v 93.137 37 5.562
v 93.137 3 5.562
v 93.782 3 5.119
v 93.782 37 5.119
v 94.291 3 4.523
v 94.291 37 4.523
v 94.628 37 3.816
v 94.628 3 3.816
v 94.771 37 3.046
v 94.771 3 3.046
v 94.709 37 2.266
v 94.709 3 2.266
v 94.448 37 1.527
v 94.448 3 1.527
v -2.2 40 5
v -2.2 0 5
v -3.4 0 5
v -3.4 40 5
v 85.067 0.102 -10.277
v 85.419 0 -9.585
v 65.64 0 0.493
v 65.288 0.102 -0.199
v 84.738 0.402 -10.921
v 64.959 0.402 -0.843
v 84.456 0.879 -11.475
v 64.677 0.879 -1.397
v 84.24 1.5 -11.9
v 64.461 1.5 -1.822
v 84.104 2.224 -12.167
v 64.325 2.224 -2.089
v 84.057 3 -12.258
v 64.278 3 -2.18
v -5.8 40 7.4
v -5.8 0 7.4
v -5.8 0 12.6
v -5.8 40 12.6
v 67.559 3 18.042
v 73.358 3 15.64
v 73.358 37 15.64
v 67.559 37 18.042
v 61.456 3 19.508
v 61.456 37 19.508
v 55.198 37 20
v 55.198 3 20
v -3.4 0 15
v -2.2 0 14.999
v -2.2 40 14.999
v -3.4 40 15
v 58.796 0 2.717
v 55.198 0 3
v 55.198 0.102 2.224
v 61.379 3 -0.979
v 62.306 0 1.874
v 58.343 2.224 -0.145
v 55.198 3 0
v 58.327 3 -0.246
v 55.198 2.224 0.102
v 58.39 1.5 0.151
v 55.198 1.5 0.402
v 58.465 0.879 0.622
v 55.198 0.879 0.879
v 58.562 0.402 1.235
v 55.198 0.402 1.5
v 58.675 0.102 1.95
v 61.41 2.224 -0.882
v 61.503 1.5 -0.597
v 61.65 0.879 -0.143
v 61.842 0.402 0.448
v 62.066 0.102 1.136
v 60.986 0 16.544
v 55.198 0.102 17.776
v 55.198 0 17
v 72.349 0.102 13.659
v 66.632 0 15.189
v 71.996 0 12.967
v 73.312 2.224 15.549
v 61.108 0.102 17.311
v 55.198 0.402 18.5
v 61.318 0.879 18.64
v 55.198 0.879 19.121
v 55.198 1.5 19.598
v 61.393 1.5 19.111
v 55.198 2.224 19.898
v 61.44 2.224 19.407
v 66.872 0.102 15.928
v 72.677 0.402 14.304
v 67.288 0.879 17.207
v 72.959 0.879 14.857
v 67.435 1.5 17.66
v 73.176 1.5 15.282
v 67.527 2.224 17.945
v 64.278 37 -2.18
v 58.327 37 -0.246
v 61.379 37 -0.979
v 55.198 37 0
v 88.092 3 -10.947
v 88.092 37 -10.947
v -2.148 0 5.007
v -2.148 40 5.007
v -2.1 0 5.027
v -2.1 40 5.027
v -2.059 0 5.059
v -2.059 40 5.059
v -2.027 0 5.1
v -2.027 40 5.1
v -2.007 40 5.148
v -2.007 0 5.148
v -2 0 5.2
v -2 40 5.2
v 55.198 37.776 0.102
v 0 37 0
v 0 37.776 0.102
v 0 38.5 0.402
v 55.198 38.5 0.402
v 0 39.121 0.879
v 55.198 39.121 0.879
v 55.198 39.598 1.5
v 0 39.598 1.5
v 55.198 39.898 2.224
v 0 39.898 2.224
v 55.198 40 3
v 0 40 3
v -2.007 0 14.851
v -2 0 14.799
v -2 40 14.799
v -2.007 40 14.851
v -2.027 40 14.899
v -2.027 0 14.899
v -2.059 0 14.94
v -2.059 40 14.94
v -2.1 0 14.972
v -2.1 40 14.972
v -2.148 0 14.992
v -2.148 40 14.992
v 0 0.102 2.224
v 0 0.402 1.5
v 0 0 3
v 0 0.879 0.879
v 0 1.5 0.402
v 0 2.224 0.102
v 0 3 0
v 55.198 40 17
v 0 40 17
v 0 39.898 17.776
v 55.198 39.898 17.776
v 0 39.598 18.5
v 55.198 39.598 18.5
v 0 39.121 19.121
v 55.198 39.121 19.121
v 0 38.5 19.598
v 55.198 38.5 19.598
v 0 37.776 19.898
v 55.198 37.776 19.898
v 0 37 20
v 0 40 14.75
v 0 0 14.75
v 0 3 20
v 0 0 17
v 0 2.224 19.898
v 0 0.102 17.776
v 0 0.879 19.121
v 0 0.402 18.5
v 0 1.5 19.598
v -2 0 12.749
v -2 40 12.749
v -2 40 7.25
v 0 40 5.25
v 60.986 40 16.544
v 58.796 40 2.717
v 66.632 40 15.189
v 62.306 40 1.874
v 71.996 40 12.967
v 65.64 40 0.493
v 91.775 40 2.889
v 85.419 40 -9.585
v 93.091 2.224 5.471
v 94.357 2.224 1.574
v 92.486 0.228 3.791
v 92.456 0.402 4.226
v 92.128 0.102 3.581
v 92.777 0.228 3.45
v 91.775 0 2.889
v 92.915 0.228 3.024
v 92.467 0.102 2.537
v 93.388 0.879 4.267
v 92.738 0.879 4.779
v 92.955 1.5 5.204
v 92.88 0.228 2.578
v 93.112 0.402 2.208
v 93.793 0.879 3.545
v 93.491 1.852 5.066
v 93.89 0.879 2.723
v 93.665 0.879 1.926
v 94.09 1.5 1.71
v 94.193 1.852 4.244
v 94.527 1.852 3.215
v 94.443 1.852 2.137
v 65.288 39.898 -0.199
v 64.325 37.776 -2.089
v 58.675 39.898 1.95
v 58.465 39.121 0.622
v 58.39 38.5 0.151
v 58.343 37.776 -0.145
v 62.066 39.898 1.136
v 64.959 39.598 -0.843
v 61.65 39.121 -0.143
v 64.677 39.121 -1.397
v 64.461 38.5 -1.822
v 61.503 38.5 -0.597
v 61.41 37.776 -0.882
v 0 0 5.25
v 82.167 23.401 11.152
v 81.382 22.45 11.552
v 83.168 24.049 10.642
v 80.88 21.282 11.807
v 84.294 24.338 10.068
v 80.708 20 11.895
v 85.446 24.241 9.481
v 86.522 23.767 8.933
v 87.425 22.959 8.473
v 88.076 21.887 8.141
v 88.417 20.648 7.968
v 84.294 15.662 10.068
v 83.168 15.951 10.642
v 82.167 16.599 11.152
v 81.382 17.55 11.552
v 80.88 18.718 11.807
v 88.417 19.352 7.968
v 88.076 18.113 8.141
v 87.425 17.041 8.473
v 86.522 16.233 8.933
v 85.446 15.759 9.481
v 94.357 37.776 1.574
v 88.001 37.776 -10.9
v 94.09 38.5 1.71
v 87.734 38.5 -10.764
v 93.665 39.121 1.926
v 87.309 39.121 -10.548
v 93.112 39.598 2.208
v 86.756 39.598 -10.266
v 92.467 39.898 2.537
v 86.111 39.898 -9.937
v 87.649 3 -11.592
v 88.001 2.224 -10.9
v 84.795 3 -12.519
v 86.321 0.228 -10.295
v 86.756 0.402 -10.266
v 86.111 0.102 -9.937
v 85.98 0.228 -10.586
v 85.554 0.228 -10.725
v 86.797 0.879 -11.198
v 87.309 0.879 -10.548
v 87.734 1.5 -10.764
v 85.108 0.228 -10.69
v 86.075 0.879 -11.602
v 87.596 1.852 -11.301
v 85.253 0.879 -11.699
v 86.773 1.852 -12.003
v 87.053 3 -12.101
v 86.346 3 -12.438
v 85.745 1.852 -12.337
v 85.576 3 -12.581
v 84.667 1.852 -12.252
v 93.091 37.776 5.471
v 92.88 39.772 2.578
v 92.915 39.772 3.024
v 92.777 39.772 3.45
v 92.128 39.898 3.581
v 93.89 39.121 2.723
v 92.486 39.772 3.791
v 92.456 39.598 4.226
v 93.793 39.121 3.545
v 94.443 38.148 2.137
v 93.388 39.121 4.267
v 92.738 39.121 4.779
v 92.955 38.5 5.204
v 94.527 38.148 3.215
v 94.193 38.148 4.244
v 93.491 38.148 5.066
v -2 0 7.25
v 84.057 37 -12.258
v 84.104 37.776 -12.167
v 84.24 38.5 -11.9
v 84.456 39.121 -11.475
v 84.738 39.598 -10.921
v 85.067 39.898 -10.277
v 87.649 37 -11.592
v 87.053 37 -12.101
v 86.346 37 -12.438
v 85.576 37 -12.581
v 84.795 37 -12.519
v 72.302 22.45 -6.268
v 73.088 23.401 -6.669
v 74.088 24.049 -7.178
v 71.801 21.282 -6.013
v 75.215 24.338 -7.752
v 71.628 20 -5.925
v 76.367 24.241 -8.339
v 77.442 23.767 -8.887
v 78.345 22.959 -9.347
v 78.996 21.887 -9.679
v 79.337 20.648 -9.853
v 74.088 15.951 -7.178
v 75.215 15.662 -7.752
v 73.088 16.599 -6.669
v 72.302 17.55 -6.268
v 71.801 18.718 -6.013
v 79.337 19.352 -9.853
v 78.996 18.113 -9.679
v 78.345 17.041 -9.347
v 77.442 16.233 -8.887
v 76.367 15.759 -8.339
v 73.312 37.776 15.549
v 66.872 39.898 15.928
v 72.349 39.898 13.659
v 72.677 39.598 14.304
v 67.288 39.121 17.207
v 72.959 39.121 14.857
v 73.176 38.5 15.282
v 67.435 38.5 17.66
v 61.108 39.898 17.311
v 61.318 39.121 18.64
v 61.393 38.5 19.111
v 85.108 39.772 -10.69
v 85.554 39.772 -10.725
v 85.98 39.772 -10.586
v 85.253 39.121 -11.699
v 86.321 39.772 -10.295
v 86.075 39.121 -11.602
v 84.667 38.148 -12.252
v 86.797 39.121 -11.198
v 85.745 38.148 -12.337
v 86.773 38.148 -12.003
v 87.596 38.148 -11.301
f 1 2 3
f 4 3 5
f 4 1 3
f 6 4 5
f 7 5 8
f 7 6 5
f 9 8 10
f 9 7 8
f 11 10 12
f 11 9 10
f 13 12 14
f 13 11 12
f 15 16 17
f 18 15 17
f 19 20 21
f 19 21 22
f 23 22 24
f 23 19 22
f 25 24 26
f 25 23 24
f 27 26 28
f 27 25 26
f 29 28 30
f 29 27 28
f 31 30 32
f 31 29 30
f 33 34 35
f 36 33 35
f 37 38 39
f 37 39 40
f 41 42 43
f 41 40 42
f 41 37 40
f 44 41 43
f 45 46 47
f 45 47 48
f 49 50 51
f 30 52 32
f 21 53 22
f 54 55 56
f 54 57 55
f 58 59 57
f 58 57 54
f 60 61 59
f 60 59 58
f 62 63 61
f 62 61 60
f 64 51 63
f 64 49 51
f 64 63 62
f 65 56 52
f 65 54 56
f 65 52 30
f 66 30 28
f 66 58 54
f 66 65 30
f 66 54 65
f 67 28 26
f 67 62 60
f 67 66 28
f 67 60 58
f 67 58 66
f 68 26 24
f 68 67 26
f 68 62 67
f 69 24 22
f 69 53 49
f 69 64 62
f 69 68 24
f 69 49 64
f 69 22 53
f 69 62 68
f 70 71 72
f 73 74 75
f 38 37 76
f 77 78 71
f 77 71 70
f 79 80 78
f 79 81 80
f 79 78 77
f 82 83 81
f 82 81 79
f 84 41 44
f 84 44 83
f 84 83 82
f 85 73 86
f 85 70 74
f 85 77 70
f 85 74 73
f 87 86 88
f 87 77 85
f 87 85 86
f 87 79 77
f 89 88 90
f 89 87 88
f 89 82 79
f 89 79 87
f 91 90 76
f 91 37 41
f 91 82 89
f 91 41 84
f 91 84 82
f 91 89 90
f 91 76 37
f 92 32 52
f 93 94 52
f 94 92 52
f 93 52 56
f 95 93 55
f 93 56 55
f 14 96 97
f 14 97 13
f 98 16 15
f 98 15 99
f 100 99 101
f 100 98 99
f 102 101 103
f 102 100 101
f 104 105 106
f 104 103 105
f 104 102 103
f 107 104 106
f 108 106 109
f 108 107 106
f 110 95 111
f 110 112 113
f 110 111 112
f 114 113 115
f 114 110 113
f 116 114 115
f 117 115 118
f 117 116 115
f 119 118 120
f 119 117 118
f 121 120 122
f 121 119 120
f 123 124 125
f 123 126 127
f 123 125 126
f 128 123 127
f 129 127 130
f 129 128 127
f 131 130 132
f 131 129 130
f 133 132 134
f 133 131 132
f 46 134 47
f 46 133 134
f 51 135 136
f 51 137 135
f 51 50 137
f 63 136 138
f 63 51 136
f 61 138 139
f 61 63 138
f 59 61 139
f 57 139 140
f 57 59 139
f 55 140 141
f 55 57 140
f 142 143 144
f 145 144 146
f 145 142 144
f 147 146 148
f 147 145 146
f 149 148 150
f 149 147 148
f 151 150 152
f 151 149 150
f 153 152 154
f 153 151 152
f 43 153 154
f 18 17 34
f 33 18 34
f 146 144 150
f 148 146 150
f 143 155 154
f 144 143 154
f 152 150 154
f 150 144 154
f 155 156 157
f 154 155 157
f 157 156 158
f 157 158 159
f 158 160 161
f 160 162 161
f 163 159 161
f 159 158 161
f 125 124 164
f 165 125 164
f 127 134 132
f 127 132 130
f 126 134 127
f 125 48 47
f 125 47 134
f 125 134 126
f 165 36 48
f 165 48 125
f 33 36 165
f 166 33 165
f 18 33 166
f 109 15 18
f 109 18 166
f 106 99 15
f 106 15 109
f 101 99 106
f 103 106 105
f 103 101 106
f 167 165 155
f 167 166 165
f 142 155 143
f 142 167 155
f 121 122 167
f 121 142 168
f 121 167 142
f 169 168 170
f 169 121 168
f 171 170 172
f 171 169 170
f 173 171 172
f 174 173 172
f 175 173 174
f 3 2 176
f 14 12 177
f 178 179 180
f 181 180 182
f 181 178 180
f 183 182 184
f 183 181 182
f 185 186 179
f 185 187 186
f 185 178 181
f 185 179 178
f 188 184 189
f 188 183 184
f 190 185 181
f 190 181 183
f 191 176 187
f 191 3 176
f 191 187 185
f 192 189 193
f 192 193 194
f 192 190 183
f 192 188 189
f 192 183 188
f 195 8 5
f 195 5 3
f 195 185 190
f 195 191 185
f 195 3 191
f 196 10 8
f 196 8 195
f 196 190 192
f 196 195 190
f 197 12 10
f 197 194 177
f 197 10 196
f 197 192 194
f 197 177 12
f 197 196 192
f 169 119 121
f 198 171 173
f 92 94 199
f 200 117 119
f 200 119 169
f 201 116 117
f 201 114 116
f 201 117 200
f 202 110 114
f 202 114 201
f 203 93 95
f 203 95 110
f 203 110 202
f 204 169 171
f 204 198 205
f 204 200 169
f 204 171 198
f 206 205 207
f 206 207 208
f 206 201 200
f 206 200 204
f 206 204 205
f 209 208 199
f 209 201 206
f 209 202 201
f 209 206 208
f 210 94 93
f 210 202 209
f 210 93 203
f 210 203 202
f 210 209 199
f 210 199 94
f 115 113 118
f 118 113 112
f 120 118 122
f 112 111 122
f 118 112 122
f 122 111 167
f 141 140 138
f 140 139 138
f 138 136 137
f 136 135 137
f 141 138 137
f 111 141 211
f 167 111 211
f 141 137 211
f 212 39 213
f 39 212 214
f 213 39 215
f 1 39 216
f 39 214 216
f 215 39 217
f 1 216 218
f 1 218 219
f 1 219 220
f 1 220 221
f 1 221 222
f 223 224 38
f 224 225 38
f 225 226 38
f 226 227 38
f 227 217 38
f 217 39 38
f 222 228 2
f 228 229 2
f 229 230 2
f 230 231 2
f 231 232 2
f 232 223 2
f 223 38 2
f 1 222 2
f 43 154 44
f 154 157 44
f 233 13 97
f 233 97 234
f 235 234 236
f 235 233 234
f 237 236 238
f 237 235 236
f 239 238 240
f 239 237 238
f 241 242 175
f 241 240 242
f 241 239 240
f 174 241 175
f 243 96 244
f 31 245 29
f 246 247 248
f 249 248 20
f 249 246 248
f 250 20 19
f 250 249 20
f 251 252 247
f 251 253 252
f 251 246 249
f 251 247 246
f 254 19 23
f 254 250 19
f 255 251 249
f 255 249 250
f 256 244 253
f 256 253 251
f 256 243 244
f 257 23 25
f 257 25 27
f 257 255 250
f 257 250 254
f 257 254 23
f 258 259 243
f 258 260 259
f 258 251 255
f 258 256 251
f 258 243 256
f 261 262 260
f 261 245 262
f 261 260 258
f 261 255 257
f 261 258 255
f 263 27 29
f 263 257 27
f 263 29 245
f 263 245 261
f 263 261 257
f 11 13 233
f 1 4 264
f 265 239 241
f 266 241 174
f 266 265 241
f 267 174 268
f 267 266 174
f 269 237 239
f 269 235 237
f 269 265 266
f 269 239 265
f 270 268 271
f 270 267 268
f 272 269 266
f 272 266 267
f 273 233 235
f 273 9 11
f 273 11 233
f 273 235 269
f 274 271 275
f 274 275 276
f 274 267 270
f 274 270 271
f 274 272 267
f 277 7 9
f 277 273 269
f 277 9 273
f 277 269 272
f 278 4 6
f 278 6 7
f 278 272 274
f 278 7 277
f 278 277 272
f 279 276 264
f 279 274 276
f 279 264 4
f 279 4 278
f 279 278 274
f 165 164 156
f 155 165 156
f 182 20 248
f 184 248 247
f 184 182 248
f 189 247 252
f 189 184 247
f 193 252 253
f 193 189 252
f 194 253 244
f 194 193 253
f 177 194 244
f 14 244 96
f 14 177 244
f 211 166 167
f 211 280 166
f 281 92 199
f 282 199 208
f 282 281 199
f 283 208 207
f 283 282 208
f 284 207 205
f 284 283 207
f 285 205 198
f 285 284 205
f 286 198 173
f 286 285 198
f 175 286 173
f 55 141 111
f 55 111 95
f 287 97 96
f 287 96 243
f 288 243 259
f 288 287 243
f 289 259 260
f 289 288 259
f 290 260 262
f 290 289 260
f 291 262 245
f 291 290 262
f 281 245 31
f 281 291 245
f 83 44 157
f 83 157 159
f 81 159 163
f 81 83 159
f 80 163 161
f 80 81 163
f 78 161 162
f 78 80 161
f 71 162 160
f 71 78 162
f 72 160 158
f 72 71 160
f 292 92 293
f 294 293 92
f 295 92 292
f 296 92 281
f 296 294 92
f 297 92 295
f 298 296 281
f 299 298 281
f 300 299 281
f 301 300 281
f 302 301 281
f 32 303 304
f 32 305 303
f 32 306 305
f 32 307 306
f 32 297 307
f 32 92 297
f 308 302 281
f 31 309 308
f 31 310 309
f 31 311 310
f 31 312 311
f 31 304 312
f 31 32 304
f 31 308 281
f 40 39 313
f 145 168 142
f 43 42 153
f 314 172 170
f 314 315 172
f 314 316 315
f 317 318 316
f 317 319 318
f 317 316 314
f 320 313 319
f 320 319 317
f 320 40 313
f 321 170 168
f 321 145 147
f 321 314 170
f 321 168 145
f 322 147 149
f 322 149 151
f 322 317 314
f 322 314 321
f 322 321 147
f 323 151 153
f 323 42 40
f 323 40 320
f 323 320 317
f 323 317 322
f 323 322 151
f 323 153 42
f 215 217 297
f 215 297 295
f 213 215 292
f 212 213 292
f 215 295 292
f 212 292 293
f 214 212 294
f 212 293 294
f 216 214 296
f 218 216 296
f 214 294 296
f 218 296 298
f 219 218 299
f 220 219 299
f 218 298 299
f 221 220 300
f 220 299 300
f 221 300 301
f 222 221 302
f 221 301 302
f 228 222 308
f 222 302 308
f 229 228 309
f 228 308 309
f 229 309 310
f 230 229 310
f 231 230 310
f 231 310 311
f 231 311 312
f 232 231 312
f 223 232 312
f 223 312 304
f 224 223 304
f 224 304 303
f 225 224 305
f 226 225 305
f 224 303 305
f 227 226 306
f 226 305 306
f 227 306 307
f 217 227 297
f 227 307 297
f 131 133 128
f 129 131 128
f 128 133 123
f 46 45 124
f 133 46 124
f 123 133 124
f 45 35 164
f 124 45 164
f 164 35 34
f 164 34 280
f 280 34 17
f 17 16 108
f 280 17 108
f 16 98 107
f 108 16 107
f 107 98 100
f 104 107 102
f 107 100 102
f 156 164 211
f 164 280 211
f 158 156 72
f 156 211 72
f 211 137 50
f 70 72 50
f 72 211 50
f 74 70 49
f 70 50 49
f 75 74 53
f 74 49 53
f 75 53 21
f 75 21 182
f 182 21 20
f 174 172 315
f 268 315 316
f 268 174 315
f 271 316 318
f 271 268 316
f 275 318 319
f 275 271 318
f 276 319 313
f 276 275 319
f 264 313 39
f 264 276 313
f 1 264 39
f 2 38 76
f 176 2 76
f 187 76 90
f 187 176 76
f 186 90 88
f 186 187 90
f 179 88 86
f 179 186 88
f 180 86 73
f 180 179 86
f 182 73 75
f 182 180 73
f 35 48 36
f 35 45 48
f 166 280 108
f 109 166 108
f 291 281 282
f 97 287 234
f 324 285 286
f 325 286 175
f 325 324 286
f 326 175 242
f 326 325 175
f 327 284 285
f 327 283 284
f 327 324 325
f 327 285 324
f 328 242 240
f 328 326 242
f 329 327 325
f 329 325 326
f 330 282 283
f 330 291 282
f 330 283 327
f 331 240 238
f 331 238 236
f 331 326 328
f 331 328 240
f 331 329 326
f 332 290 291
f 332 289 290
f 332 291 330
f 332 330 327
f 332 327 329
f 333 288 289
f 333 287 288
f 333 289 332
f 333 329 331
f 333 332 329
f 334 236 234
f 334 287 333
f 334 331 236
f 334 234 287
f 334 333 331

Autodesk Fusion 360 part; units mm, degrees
sketch "Sketch1" plane through (0, 0, 0) normal (0, 1, 0) x (1, 0, 0)
  line L0 (0, 0) -> (55.1984, 0)
  line L1 (64.2782, 2.1799) -> (86.7302, 13.6197)
  line L2 (0, -20) -> (55.1984, -20)
  line L3 (73.358, -15.6403) -> (95.81, -4.2004)
  line L4 (86.7302, 13.6197) -> (95.81, -4.2004)
  line L5 (-2, -12.9989) -> (-2, -14.799)
  line L6 (-2.1998, -14.999) -> (-3.4, -15)
  line L7 (-2, -7) -> (-2, -5.2)
  line L8 (-2.2, -5) -> (-3.4, -5)
  line L9 (-3.4, -5) -> (7.0965, -5) construction
  line L10 (-3.4, -15) -> (7.6345, -15) construction
  line L11 (-5.8, -10) -> (-5.8, -7.4)
  line L12 (-5.8, -10) -> (-5.8, -12.6)
  line L13 (-3.4, -5) -> (-5.8, -7.4)
  line L14 (-3.4, -15) -> (-5.8, -12.6)
  line L15 (0, 0) -> (0, -5)
  line L16 (0, -15) -> (0, -20)
  arc A0 (55.1984, -20) -> (73.358, -15.6403) centre (55.1984, 20) ccw
  arc A1 (55.1984, 0) -> (64.2782, 2.1799) centre (55.1984, 20) ccw
  line L17 (-2, -12.9989) -> (-2, -12.7489)
  line L18 (0, -15) -> (0, -14.75)
  line L19 (-2, -12.7489) -> (0, -14.75)
  line L20 (0, -5) -> (0, -5.25)
  line L21 (-2, -7) -> (-2, -7.25)
  line L22 (-2, -7.25) -> (0, -5.25)
  arc A2 (-2, -5.2) -> (-2.2, -5) centre (-2.2, -5.2) ccw
  arc A3 (-2.1998, -14.999) -> (-2, -14.799) centre (-2.2, -14.799) ccw
  point P0 (60, 0)
  point P1 (-2, -14.9989)
  point P2 (-2, -5)
  dimension "d1" = 153
  dimension "d2" = 30
  dimension "d4" = 1.4
  dimension "d5" = 1.4
  dimension "d7" = 135
  dimension "d8" = 135
  dimension "d10" = 40
  dimension "d11" = 20
  dimension "d18" = 2
  dimension "d19" = 5
  dimension "d20" = 0.25
  dimension "d21" = 0.25
  dimension "d22" = 0.25
  dimension "d23" = 0.25
  dimension "d24" = 0.2
  dimension "d25" = 0.2
extrude "Extrude1" add sketch "Sketch1" along normal blind 40
sketch "Sketch2" plane through (21.4463, 0, 42.0906) normal (0.454, 0, 0.891) x (0.891, 0, -0.454)
  line L0 (58.262, 0) -> (83.4604, 0)
  line L1 (83.4604, 0) -> (83.4604, 40)
  line L2 (83.4604, 40) -> (58.262, 40)
  line L3 (58.262, 40) -> (58.262, 0)
sketch "Sketch3" plane through (12.3664, 0, 24.2705) normal (-0.454, 0, -0.891) x (-0.891, 0, 0.454)
  line L0 (-83.4604, 0) -> (-58.262, 0)
  line L1 (-58.262, 0) -> (-58.262, 40)
  line L2 (-58.262, 40) -> (-83.4604, 40)
  line L3 (-83.4604, 40) -> (-83.4604, 0)
  circle A0 centre (-70.8612, 20) radius 4.35
  dimension "d14" = 8.7
extrude "Extrude2" cut sketch "Sketch3" against normal blind 20 contours A0
fillet "Fillet1" radius 3 16 edges at (27.5992, 40, 20) (64.5362, 40, 18.8948) (84.584, 40, 9.9203) (27.5992, 0, 20) (64.5362, 0, 18.8948) (84.584, 0, 9.9203) (75.5042, 40, -7.8998) (59.8673, 40, -0.5526) (27.5992, 40, 0) (91.2701, 40, -4.7096) (95.81, 20, 4.2004) (86.7302, 20, -13.6197) (91.2701, 0, -4.7096) (27.5992, 0, 0) (59.8673, 0, -0.5526) (75.5042, 0, -7.8998)
